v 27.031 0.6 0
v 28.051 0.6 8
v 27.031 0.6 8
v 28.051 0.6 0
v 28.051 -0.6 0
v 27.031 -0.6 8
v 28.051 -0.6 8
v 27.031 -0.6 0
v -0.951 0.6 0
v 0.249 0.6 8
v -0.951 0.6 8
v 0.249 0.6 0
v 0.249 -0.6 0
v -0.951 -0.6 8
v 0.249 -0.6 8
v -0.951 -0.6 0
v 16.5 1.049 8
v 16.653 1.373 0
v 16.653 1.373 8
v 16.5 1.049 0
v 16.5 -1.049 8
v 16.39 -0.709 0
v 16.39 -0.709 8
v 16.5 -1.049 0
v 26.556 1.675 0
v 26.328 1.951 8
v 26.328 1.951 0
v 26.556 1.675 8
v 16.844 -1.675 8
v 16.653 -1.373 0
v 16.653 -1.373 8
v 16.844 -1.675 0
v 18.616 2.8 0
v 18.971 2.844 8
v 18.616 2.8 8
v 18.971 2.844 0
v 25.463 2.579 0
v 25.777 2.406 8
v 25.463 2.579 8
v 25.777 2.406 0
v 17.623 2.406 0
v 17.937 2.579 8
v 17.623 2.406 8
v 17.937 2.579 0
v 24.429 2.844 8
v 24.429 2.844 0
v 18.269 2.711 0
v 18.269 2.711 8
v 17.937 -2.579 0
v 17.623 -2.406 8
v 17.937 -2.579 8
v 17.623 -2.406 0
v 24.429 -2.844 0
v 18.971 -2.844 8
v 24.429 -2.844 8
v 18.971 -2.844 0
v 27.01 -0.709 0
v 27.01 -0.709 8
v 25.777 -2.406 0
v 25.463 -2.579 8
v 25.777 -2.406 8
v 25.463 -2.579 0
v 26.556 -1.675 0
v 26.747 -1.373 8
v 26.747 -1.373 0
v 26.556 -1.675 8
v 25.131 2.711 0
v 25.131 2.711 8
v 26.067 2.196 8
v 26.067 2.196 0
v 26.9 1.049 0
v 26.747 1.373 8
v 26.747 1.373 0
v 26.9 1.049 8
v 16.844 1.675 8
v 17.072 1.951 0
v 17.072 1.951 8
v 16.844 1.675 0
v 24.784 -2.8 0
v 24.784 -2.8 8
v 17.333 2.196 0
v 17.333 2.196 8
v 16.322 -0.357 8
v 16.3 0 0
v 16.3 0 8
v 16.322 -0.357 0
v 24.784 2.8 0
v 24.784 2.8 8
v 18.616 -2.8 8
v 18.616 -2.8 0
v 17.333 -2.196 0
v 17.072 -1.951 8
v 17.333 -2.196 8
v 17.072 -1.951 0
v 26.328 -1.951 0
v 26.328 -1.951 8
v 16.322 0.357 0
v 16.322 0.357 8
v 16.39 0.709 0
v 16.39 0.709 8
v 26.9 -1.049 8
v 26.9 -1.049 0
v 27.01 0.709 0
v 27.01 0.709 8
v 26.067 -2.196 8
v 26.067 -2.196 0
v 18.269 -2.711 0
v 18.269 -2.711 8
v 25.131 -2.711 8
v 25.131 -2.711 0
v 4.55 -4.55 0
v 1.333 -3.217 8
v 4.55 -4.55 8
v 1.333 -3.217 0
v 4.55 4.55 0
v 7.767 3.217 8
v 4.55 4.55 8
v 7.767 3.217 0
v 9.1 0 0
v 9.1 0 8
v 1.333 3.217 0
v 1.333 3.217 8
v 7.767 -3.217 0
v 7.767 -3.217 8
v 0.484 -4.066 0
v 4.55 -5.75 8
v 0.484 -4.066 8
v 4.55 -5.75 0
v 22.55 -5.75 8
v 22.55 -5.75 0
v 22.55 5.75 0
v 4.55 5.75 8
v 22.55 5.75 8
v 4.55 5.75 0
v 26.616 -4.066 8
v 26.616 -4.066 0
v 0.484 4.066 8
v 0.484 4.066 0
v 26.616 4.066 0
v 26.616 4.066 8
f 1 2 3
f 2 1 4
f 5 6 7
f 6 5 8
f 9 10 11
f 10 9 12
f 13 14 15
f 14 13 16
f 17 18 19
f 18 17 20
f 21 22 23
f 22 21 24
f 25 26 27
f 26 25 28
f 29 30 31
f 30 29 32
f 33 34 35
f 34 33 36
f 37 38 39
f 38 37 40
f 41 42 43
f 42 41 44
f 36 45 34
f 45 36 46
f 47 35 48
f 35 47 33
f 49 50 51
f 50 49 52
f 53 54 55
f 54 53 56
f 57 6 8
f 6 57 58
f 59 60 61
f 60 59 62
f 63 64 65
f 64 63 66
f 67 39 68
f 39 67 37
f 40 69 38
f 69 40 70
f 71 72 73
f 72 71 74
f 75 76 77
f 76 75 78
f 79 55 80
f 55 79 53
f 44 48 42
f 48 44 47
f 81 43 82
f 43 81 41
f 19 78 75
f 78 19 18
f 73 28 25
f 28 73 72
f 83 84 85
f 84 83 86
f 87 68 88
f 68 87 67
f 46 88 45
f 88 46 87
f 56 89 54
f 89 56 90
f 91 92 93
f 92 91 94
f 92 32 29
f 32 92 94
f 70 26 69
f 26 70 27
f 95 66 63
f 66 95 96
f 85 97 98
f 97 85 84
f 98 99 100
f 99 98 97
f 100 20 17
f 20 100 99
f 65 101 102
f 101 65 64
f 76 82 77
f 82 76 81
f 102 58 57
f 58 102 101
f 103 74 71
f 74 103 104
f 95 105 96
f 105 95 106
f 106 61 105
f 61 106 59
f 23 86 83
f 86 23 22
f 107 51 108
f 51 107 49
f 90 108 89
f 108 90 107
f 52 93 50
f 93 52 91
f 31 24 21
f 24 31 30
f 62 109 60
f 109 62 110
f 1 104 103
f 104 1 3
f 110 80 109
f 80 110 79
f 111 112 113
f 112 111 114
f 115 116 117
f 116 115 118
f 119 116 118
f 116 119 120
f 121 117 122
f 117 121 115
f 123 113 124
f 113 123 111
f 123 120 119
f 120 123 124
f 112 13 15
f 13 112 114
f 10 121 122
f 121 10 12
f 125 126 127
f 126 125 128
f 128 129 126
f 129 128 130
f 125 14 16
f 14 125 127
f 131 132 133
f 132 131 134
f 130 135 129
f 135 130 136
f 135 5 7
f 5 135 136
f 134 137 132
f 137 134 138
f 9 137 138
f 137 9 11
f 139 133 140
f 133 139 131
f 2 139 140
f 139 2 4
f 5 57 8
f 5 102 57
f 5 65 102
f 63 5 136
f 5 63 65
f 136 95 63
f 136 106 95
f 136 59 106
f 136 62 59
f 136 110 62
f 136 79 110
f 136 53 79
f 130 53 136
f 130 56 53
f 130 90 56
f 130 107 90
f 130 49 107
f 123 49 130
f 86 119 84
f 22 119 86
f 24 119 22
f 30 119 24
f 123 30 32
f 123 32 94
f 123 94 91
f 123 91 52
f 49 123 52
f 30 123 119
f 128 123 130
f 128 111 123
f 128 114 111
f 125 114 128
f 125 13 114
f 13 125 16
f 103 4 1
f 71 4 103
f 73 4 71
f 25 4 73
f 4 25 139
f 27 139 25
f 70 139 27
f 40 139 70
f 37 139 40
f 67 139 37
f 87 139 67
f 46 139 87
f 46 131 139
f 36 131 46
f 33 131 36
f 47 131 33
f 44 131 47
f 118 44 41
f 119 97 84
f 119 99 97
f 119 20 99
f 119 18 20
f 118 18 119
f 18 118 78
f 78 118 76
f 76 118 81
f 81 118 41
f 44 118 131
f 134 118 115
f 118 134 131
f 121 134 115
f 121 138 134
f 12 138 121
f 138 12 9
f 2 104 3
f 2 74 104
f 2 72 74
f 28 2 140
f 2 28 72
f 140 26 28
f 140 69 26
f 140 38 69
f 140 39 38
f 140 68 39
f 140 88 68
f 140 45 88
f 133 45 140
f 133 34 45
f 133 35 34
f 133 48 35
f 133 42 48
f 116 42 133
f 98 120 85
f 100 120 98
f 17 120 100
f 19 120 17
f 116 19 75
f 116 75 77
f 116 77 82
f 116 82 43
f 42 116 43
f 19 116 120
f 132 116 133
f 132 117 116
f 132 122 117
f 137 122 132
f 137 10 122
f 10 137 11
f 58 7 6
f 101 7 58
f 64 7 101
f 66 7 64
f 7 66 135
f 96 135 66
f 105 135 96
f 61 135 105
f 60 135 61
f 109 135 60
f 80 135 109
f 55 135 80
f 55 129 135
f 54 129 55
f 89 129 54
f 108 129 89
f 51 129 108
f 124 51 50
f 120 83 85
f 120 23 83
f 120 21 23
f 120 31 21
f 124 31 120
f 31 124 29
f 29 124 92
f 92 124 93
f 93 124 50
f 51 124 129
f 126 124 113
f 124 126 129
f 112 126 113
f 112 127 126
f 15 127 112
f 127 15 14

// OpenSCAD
$fn = 50;

auxDiameter = 9.1;
auxSides = 8;
overallHeight = 8;
usbLength = 5.7;
usbWidth = 10.8;
spacing = 7.2;
overallThickness = 1.2;

// handles();
// translate([27,0,0]) mirror([1,0,0]) handles();



difference () {
  translate([-overallThickness,0,0]) punchIn();
  translate([0,0,-.5]) punchOuts();
}

module handles()
{
  handle();
    mirror([0,1,0]) handle();
}
module handle() 
{
  translate([(auxDiameter/2)+.25,(auxDiameter/2)]) 
    rotate([0,0,22.5]) 
      cube([8,overallThickness,overallHeight]);
}
module punchIn()
{
  hull () {
    aux(diameter=auxDiameter+(overallThickness*2), height=overallHeight);
    translate([spacing+usbWidth,0,0]) aux(auxDiameter+(overallThickness*2), height=overallHeight);
  }
}

module punchOuts ()
{
  union(){
    translate([auxDiameter+spacing+usbWidth-2,-overallThickness/2,0]) cube([4, overallThickness,overallHeight+1]);
    translate([-2,-overallThickness/2,0]) cube([4, overallThickness,overallHeight+1]);
    translate([auxDiameter + spacing,0,0]) usb(height=overallHeight+1);
    aux(diameter=auxDiameter, height=overallHeight+1);
  }
  
}

module aux (diameter, height)
{
  translate([diameter/2, 0, 0]) 
    cylinder(d=diameter, $fn=auxSides, h=height);
}

module usb (height) 
{
  translate([(usbLength/2),0,0]) 
  hull(){
    cylinder(d=usbLength, h=height);
    translate([usbWidth-usbLength,0,0]) cylinder(d=usbLength, h=height);
  }
}
